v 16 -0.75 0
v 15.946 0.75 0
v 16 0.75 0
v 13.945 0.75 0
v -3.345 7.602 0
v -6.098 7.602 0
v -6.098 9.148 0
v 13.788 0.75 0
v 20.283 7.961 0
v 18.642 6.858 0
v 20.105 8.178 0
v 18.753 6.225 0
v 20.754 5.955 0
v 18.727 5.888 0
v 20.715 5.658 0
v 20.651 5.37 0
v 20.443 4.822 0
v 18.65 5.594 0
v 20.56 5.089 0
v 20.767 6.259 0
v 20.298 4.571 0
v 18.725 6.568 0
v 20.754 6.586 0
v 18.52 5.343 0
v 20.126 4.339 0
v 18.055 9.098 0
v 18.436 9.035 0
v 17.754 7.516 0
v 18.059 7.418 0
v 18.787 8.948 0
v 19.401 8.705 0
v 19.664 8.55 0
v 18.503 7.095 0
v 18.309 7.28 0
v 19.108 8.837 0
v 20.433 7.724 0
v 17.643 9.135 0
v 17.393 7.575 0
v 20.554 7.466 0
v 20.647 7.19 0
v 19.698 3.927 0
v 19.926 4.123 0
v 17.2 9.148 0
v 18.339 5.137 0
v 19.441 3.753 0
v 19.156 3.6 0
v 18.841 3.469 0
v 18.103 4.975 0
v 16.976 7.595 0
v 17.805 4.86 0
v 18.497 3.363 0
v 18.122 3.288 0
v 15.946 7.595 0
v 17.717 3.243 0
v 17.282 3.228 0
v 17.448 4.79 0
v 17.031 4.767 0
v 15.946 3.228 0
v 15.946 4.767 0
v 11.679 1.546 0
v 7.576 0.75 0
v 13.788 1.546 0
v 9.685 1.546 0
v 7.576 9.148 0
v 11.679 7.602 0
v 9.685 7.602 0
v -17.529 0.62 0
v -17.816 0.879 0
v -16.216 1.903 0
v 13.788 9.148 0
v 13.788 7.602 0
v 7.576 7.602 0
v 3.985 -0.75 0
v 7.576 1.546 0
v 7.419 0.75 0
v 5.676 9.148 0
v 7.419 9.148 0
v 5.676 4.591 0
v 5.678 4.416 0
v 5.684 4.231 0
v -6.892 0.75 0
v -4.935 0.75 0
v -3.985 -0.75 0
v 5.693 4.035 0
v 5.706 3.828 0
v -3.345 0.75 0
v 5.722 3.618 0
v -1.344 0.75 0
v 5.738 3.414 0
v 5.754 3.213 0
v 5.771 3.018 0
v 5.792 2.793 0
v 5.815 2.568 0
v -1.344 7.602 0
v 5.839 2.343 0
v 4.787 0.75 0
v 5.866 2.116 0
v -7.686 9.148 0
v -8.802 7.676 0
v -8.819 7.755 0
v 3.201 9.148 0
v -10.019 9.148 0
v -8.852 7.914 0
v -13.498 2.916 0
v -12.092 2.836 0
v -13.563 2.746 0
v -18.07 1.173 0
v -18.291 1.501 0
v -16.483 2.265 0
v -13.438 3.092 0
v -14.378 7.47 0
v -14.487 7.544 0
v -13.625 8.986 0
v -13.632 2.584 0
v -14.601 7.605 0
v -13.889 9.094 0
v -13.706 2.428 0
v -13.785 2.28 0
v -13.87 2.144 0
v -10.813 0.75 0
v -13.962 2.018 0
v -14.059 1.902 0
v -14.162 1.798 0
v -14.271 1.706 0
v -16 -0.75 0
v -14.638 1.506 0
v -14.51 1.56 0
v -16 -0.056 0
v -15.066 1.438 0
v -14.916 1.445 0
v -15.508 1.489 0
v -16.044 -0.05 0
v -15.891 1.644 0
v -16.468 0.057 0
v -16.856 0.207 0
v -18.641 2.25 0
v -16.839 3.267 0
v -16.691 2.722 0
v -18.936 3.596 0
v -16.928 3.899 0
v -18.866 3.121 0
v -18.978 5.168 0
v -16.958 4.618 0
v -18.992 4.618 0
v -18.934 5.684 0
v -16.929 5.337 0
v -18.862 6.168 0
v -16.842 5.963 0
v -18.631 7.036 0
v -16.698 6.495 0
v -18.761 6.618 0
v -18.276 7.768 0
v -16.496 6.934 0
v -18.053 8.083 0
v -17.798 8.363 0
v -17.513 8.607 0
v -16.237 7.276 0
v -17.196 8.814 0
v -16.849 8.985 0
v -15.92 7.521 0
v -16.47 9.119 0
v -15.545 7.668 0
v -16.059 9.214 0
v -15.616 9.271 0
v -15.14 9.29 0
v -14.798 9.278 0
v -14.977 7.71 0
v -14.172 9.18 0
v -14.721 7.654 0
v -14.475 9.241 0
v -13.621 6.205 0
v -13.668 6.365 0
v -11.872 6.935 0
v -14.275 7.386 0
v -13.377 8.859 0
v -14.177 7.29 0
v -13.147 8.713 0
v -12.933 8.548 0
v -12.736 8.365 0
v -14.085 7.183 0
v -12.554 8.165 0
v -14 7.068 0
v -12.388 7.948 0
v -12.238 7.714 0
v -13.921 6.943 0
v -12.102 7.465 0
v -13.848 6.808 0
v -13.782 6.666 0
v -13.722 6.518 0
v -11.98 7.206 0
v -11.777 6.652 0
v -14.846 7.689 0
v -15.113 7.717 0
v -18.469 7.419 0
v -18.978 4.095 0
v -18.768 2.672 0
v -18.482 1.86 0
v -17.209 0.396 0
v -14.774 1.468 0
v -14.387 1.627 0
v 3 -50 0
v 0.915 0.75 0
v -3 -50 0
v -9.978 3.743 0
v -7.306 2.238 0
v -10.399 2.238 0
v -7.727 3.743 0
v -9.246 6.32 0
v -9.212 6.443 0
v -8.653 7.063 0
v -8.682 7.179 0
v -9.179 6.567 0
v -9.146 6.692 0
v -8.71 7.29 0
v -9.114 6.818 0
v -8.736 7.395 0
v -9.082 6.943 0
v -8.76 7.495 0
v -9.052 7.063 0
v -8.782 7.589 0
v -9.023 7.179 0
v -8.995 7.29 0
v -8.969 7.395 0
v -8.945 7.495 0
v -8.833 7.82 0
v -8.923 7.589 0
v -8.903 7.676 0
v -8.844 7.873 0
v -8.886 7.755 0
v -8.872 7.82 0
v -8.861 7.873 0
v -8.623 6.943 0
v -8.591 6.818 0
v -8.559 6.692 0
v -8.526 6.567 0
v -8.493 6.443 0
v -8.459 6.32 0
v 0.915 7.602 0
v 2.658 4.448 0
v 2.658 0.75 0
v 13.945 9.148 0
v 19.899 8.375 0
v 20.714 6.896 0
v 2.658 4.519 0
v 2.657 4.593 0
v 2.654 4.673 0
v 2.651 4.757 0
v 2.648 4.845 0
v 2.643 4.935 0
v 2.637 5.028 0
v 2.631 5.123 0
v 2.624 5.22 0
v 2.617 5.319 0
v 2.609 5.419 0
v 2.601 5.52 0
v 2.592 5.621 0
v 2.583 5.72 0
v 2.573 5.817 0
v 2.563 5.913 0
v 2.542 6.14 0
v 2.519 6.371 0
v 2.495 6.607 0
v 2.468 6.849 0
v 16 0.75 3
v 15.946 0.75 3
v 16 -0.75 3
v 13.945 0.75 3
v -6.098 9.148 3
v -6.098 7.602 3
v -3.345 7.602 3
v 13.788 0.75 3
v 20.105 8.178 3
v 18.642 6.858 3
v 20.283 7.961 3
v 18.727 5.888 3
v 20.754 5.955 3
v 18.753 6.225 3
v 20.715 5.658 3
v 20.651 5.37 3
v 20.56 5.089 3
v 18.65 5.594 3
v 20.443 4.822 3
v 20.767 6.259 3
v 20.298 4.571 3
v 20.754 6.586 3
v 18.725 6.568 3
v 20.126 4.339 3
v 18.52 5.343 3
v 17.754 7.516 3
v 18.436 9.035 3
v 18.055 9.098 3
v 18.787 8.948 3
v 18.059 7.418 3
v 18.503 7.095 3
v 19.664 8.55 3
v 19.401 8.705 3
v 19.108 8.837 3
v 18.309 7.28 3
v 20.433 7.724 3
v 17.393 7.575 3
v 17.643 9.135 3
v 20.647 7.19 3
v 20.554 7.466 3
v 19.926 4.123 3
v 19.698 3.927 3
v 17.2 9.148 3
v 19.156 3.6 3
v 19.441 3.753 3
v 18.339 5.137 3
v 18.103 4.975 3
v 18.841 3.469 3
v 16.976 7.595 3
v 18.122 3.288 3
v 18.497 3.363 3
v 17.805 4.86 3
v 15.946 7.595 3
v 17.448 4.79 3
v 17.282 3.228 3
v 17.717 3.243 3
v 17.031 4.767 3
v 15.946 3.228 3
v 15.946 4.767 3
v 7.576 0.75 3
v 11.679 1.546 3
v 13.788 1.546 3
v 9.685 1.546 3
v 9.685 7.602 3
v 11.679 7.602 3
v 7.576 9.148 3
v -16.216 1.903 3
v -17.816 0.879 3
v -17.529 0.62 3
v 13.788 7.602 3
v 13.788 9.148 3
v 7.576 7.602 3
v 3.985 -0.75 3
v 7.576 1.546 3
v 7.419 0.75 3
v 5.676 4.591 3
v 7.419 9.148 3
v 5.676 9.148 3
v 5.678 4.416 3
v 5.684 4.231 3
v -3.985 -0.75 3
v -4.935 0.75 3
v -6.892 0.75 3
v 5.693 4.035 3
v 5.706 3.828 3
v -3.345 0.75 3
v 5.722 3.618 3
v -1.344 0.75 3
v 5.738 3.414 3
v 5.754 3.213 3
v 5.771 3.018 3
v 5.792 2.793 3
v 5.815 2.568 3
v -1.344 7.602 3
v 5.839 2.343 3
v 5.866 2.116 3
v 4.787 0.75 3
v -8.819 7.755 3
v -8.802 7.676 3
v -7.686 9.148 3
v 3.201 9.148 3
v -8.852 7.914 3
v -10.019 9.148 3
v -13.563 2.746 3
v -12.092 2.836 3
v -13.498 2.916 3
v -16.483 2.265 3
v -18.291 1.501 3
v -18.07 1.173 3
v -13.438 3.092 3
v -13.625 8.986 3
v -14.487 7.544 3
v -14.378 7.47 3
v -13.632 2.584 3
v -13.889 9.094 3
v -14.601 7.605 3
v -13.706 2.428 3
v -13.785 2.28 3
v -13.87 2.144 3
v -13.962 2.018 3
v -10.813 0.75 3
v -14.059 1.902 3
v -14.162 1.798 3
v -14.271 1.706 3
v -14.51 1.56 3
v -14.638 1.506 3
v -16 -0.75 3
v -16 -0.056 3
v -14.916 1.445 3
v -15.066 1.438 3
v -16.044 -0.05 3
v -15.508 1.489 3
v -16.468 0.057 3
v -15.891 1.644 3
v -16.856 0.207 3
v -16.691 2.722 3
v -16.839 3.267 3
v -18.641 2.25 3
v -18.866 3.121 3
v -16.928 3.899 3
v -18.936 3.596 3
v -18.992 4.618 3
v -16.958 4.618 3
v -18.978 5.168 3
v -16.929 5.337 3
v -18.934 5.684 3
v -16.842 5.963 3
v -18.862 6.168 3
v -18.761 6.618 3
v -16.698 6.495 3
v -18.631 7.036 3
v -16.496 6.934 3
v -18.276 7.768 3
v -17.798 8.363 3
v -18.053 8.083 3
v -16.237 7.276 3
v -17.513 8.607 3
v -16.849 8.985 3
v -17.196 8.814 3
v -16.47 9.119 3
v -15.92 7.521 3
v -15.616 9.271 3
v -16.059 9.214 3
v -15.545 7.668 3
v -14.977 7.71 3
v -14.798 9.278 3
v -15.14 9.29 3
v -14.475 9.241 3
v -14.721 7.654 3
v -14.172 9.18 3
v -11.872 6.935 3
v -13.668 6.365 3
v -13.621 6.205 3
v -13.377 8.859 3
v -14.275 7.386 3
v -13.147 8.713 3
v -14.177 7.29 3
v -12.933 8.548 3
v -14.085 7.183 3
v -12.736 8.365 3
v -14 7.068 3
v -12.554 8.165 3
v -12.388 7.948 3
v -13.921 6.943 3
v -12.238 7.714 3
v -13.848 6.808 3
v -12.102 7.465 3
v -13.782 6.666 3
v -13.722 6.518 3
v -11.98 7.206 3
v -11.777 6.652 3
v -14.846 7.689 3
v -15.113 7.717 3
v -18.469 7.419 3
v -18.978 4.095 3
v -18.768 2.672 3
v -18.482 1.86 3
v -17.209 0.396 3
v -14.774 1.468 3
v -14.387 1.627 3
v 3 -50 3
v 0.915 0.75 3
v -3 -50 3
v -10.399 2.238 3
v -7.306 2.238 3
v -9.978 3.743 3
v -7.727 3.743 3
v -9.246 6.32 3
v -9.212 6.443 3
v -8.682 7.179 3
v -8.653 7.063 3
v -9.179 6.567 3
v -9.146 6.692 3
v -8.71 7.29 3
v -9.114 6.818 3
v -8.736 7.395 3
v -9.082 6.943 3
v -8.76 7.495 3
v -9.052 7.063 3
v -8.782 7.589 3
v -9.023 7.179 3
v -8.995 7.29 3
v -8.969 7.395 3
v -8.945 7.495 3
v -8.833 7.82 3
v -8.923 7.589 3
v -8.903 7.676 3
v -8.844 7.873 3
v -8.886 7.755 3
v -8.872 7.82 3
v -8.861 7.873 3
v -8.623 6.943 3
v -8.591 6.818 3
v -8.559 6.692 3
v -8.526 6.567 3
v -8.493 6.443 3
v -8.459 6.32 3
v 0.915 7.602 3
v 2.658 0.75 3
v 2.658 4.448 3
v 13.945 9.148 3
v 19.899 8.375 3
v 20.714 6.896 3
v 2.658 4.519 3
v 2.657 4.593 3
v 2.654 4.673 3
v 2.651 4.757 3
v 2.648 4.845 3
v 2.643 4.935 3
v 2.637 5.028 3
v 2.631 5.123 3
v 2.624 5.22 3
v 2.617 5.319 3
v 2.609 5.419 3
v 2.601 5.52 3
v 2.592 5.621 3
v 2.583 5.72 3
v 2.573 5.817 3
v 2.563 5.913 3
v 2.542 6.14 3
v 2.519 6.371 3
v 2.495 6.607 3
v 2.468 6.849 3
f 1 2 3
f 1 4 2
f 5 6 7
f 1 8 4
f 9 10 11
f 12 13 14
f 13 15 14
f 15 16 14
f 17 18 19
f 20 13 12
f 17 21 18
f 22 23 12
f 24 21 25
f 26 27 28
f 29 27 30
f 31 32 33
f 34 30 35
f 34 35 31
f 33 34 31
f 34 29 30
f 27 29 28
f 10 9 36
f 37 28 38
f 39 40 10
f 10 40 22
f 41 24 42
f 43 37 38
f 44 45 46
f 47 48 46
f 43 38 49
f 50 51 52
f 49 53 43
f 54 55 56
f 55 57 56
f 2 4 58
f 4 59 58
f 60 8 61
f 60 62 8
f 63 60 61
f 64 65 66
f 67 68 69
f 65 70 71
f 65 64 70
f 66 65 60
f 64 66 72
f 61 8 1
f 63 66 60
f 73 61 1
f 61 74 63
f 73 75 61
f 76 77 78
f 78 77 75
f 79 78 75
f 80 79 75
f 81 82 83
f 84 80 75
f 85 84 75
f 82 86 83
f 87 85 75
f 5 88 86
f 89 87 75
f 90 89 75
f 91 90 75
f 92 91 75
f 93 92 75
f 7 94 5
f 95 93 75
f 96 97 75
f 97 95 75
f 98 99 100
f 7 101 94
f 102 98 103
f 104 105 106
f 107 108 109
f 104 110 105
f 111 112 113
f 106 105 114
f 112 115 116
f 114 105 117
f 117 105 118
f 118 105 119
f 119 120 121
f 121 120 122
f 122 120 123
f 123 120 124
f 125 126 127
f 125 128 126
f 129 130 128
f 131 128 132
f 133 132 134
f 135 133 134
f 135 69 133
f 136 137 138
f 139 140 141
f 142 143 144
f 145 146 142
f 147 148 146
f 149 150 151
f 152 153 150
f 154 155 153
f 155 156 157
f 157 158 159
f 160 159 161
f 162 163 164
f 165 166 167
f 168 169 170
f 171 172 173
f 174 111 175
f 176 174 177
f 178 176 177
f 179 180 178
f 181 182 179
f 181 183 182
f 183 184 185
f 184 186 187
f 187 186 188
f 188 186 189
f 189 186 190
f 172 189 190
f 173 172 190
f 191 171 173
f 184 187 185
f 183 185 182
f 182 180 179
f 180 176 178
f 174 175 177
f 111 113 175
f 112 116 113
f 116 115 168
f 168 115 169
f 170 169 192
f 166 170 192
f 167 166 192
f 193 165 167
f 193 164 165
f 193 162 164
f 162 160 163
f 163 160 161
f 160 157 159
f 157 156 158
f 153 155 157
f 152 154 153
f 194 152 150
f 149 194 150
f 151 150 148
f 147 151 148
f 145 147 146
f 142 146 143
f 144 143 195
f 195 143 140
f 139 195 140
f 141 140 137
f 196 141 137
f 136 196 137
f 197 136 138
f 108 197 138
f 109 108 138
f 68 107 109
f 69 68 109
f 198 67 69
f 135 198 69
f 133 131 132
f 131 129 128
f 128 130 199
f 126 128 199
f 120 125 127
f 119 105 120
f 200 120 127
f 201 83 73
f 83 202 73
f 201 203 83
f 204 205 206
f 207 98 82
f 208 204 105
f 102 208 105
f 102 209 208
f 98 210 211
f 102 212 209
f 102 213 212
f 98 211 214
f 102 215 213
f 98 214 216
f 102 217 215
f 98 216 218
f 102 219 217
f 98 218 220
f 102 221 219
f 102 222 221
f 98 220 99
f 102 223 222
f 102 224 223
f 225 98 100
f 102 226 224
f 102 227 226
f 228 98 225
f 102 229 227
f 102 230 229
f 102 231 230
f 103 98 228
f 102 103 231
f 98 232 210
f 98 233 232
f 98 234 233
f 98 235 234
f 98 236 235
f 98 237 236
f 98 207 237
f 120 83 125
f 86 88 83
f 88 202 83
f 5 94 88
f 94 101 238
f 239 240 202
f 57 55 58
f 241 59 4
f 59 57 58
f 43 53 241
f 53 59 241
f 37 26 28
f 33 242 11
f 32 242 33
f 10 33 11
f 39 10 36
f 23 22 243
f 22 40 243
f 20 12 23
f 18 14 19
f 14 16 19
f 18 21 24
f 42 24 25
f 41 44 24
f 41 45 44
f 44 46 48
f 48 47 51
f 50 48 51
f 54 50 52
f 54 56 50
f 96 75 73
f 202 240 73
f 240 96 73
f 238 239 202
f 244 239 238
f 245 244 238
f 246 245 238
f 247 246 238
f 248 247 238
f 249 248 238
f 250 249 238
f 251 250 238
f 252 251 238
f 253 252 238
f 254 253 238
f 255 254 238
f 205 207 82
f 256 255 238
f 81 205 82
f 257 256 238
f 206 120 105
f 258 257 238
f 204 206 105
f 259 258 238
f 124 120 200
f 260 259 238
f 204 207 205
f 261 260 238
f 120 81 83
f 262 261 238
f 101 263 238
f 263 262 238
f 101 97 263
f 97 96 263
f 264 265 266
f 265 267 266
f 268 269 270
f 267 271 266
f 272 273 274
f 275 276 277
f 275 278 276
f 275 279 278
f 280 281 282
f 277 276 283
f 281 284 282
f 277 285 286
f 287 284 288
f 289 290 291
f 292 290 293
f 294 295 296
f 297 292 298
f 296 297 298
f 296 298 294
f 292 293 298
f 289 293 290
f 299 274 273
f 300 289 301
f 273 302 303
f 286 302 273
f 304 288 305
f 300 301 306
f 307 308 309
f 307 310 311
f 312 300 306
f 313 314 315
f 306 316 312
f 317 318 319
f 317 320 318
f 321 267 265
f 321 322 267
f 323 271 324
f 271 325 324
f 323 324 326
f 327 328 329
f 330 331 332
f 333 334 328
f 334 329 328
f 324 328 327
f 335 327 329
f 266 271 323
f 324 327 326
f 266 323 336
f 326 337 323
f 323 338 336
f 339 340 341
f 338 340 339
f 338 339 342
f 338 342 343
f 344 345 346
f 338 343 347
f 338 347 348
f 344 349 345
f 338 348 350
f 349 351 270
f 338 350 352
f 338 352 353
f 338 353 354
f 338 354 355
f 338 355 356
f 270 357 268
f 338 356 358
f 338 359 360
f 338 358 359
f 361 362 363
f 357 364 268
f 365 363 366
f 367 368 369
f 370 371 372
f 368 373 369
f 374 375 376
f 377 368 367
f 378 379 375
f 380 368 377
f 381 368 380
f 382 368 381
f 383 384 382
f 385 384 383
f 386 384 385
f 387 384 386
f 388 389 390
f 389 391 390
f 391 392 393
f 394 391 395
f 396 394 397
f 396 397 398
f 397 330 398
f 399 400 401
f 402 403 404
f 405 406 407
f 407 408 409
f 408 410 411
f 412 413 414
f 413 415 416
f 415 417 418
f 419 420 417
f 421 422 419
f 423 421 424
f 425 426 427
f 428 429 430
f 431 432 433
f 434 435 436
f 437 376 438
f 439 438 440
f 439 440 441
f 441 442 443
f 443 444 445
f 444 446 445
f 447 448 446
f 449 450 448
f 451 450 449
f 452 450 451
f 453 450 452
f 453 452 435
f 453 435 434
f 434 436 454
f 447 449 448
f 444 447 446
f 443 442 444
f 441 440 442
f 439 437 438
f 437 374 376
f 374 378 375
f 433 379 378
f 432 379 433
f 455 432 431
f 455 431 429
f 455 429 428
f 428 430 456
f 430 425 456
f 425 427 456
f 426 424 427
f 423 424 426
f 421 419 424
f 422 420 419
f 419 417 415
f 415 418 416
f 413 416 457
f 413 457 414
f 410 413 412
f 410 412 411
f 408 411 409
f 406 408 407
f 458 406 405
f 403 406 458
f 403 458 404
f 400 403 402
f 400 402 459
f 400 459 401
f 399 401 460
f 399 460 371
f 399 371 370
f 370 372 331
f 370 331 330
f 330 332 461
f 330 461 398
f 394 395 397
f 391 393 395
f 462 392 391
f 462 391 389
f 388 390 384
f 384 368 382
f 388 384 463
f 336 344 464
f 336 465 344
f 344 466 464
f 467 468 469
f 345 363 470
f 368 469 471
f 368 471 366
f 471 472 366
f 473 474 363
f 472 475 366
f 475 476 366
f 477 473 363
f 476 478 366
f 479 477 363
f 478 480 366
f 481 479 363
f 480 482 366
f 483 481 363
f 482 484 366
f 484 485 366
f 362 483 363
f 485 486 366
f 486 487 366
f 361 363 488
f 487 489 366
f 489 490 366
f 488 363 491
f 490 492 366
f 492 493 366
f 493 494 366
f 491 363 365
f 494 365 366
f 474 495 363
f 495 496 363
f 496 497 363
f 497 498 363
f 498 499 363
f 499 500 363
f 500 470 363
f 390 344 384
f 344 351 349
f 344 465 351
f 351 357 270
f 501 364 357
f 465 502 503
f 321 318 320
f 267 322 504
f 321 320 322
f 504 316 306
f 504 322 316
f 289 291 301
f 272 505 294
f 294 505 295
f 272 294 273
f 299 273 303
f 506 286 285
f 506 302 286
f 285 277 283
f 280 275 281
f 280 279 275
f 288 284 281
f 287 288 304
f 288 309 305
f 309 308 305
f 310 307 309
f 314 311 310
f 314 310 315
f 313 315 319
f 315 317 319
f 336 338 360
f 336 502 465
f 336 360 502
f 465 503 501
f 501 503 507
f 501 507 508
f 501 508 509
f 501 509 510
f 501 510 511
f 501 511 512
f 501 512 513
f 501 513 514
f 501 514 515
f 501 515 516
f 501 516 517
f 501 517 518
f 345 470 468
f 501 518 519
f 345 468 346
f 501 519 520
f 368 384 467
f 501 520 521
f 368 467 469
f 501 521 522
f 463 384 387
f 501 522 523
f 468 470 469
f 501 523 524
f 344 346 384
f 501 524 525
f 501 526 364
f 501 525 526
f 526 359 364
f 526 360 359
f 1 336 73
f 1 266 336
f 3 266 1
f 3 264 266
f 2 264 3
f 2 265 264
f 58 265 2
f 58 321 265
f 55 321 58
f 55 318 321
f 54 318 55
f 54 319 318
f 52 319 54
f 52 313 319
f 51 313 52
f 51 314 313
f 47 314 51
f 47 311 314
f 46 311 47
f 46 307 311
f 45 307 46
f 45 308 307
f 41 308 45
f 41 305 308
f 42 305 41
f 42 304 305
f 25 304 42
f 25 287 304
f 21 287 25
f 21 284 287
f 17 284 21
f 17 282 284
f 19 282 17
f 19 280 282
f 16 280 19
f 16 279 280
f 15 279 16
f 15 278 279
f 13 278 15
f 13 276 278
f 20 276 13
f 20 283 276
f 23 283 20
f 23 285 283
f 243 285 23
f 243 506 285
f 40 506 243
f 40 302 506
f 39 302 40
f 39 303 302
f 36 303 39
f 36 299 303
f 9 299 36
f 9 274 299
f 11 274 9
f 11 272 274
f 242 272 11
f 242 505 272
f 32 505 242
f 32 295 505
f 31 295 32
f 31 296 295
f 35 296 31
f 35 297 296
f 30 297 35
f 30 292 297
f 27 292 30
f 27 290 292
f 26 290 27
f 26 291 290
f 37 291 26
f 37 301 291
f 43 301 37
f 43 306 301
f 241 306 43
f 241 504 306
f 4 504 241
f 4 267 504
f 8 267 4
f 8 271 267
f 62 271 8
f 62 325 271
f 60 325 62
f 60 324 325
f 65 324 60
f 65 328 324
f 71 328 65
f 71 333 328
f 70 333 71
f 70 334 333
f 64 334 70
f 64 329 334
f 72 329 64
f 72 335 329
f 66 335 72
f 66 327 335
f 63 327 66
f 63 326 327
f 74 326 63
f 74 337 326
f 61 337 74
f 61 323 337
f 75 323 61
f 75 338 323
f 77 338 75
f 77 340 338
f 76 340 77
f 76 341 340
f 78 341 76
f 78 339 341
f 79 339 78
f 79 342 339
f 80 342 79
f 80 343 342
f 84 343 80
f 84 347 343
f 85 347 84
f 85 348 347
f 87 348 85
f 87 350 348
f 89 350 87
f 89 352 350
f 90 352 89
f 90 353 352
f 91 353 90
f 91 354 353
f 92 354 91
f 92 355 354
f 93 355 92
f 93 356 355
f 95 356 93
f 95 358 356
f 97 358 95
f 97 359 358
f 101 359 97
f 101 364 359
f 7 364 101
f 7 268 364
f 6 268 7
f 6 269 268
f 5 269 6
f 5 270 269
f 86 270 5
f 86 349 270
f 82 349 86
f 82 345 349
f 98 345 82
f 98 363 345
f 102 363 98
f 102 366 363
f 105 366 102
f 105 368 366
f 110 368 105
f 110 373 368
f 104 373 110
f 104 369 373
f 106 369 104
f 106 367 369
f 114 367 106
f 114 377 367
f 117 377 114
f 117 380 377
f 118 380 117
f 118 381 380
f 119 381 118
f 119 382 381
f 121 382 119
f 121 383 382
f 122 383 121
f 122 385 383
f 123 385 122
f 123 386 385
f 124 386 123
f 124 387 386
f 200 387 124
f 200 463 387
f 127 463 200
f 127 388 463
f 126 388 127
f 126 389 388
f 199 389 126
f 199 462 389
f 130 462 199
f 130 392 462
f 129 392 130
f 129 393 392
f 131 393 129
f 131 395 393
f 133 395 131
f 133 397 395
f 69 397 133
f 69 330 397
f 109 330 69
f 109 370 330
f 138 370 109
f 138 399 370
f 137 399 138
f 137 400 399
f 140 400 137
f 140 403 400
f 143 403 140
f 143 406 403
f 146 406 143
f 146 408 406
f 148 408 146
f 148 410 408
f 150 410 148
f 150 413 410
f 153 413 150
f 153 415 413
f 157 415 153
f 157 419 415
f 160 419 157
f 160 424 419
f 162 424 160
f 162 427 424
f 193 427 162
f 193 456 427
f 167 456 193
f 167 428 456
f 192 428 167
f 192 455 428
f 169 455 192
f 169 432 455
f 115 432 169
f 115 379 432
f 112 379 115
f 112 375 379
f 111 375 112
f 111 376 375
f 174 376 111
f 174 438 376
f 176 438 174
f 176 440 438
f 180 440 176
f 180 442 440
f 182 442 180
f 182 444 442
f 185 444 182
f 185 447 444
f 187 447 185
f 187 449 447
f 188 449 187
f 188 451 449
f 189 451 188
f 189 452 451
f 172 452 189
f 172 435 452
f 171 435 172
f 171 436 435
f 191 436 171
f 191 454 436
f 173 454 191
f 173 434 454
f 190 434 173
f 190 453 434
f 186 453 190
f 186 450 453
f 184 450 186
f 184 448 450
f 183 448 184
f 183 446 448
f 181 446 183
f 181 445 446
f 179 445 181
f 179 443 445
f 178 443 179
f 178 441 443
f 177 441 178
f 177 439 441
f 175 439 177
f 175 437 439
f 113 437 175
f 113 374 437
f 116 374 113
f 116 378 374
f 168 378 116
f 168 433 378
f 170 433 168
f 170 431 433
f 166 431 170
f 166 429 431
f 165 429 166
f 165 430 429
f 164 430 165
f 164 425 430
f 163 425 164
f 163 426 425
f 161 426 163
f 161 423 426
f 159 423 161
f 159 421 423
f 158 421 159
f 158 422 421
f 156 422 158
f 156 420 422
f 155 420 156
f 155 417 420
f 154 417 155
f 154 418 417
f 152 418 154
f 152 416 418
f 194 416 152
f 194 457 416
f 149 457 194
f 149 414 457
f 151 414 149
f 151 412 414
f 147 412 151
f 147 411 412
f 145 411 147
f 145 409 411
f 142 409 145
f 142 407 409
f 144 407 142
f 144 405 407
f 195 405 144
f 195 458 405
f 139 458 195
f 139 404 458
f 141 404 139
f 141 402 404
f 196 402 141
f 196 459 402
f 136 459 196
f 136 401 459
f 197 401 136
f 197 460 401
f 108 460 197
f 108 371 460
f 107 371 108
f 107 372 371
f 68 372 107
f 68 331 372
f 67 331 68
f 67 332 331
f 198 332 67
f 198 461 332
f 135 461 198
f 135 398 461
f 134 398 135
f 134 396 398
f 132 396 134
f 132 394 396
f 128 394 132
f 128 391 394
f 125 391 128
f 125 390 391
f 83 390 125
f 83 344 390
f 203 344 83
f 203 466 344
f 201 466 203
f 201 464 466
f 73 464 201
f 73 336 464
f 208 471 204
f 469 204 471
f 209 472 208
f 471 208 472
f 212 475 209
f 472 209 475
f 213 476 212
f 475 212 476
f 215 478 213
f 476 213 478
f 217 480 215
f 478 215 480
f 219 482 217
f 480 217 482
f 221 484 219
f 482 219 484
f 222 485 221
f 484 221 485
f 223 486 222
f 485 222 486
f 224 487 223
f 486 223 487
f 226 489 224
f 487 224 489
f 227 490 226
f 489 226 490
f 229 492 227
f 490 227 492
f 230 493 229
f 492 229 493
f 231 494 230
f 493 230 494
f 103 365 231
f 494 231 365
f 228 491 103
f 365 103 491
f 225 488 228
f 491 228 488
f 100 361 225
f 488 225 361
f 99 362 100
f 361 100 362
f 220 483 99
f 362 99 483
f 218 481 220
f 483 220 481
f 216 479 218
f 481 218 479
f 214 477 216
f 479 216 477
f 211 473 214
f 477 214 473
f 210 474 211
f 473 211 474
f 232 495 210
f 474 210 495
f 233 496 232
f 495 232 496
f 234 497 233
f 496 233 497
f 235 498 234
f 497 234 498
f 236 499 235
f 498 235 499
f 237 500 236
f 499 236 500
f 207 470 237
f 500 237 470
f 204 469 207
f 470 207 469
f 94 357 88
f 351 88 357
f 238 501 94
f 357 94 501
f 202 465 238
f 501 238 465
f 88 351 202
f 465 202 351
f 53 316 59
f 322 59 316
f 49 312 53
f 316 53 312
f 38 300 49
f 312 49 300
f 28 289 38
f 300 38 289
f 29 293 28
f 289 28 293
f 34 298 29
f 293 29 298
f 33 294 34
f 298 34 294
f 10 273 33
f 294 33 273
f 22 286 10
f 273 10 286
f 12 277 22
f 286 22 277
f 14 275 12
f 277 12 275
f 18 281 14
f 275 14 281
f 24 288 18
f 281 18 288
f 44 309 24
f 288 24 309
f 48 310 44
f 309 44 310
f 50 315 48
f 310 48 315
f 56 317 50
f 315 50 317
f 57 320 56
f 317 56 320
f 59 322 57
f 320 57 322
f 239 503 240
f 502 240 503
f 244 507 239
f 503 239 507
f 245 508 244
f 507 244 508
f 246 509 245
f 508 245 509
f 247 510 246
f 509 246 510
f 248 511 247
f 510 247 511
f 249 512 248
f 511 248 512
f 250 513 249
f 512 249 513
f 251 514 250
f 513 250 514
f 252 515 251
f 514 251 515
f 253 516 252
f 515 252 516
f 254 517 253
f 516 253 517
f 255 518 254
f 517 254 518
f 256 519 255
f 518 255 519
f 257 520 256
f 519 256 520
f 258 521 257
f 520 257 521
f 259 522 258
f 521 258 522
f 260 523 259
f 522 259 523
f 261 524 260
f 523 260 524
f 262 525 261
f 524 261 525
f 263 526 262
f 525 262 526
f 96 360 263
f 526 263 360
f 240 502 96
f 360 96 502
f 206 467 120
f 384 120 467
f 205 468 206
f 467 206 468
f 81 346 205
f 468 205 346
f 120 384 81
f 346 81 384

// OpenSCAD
linear_extrude(0, 0, 3) union() {
//    translate([0, 9, 0])
//    text("JALEPENO", font = "liberation mono:style=Bold", size = 10, spacing=0.8, halign="center", valign="baseline");
    text("CATNIP", font = "liberation mono:style=Bold", size = 10, spacing=0.8, halign="center", valign="baseline");
    square([32, 1.5], center = true);
    polygon([
        [-4, 0],
        [4, 0],
        [3, -50],
        [-3, -50]
    ]);
}
